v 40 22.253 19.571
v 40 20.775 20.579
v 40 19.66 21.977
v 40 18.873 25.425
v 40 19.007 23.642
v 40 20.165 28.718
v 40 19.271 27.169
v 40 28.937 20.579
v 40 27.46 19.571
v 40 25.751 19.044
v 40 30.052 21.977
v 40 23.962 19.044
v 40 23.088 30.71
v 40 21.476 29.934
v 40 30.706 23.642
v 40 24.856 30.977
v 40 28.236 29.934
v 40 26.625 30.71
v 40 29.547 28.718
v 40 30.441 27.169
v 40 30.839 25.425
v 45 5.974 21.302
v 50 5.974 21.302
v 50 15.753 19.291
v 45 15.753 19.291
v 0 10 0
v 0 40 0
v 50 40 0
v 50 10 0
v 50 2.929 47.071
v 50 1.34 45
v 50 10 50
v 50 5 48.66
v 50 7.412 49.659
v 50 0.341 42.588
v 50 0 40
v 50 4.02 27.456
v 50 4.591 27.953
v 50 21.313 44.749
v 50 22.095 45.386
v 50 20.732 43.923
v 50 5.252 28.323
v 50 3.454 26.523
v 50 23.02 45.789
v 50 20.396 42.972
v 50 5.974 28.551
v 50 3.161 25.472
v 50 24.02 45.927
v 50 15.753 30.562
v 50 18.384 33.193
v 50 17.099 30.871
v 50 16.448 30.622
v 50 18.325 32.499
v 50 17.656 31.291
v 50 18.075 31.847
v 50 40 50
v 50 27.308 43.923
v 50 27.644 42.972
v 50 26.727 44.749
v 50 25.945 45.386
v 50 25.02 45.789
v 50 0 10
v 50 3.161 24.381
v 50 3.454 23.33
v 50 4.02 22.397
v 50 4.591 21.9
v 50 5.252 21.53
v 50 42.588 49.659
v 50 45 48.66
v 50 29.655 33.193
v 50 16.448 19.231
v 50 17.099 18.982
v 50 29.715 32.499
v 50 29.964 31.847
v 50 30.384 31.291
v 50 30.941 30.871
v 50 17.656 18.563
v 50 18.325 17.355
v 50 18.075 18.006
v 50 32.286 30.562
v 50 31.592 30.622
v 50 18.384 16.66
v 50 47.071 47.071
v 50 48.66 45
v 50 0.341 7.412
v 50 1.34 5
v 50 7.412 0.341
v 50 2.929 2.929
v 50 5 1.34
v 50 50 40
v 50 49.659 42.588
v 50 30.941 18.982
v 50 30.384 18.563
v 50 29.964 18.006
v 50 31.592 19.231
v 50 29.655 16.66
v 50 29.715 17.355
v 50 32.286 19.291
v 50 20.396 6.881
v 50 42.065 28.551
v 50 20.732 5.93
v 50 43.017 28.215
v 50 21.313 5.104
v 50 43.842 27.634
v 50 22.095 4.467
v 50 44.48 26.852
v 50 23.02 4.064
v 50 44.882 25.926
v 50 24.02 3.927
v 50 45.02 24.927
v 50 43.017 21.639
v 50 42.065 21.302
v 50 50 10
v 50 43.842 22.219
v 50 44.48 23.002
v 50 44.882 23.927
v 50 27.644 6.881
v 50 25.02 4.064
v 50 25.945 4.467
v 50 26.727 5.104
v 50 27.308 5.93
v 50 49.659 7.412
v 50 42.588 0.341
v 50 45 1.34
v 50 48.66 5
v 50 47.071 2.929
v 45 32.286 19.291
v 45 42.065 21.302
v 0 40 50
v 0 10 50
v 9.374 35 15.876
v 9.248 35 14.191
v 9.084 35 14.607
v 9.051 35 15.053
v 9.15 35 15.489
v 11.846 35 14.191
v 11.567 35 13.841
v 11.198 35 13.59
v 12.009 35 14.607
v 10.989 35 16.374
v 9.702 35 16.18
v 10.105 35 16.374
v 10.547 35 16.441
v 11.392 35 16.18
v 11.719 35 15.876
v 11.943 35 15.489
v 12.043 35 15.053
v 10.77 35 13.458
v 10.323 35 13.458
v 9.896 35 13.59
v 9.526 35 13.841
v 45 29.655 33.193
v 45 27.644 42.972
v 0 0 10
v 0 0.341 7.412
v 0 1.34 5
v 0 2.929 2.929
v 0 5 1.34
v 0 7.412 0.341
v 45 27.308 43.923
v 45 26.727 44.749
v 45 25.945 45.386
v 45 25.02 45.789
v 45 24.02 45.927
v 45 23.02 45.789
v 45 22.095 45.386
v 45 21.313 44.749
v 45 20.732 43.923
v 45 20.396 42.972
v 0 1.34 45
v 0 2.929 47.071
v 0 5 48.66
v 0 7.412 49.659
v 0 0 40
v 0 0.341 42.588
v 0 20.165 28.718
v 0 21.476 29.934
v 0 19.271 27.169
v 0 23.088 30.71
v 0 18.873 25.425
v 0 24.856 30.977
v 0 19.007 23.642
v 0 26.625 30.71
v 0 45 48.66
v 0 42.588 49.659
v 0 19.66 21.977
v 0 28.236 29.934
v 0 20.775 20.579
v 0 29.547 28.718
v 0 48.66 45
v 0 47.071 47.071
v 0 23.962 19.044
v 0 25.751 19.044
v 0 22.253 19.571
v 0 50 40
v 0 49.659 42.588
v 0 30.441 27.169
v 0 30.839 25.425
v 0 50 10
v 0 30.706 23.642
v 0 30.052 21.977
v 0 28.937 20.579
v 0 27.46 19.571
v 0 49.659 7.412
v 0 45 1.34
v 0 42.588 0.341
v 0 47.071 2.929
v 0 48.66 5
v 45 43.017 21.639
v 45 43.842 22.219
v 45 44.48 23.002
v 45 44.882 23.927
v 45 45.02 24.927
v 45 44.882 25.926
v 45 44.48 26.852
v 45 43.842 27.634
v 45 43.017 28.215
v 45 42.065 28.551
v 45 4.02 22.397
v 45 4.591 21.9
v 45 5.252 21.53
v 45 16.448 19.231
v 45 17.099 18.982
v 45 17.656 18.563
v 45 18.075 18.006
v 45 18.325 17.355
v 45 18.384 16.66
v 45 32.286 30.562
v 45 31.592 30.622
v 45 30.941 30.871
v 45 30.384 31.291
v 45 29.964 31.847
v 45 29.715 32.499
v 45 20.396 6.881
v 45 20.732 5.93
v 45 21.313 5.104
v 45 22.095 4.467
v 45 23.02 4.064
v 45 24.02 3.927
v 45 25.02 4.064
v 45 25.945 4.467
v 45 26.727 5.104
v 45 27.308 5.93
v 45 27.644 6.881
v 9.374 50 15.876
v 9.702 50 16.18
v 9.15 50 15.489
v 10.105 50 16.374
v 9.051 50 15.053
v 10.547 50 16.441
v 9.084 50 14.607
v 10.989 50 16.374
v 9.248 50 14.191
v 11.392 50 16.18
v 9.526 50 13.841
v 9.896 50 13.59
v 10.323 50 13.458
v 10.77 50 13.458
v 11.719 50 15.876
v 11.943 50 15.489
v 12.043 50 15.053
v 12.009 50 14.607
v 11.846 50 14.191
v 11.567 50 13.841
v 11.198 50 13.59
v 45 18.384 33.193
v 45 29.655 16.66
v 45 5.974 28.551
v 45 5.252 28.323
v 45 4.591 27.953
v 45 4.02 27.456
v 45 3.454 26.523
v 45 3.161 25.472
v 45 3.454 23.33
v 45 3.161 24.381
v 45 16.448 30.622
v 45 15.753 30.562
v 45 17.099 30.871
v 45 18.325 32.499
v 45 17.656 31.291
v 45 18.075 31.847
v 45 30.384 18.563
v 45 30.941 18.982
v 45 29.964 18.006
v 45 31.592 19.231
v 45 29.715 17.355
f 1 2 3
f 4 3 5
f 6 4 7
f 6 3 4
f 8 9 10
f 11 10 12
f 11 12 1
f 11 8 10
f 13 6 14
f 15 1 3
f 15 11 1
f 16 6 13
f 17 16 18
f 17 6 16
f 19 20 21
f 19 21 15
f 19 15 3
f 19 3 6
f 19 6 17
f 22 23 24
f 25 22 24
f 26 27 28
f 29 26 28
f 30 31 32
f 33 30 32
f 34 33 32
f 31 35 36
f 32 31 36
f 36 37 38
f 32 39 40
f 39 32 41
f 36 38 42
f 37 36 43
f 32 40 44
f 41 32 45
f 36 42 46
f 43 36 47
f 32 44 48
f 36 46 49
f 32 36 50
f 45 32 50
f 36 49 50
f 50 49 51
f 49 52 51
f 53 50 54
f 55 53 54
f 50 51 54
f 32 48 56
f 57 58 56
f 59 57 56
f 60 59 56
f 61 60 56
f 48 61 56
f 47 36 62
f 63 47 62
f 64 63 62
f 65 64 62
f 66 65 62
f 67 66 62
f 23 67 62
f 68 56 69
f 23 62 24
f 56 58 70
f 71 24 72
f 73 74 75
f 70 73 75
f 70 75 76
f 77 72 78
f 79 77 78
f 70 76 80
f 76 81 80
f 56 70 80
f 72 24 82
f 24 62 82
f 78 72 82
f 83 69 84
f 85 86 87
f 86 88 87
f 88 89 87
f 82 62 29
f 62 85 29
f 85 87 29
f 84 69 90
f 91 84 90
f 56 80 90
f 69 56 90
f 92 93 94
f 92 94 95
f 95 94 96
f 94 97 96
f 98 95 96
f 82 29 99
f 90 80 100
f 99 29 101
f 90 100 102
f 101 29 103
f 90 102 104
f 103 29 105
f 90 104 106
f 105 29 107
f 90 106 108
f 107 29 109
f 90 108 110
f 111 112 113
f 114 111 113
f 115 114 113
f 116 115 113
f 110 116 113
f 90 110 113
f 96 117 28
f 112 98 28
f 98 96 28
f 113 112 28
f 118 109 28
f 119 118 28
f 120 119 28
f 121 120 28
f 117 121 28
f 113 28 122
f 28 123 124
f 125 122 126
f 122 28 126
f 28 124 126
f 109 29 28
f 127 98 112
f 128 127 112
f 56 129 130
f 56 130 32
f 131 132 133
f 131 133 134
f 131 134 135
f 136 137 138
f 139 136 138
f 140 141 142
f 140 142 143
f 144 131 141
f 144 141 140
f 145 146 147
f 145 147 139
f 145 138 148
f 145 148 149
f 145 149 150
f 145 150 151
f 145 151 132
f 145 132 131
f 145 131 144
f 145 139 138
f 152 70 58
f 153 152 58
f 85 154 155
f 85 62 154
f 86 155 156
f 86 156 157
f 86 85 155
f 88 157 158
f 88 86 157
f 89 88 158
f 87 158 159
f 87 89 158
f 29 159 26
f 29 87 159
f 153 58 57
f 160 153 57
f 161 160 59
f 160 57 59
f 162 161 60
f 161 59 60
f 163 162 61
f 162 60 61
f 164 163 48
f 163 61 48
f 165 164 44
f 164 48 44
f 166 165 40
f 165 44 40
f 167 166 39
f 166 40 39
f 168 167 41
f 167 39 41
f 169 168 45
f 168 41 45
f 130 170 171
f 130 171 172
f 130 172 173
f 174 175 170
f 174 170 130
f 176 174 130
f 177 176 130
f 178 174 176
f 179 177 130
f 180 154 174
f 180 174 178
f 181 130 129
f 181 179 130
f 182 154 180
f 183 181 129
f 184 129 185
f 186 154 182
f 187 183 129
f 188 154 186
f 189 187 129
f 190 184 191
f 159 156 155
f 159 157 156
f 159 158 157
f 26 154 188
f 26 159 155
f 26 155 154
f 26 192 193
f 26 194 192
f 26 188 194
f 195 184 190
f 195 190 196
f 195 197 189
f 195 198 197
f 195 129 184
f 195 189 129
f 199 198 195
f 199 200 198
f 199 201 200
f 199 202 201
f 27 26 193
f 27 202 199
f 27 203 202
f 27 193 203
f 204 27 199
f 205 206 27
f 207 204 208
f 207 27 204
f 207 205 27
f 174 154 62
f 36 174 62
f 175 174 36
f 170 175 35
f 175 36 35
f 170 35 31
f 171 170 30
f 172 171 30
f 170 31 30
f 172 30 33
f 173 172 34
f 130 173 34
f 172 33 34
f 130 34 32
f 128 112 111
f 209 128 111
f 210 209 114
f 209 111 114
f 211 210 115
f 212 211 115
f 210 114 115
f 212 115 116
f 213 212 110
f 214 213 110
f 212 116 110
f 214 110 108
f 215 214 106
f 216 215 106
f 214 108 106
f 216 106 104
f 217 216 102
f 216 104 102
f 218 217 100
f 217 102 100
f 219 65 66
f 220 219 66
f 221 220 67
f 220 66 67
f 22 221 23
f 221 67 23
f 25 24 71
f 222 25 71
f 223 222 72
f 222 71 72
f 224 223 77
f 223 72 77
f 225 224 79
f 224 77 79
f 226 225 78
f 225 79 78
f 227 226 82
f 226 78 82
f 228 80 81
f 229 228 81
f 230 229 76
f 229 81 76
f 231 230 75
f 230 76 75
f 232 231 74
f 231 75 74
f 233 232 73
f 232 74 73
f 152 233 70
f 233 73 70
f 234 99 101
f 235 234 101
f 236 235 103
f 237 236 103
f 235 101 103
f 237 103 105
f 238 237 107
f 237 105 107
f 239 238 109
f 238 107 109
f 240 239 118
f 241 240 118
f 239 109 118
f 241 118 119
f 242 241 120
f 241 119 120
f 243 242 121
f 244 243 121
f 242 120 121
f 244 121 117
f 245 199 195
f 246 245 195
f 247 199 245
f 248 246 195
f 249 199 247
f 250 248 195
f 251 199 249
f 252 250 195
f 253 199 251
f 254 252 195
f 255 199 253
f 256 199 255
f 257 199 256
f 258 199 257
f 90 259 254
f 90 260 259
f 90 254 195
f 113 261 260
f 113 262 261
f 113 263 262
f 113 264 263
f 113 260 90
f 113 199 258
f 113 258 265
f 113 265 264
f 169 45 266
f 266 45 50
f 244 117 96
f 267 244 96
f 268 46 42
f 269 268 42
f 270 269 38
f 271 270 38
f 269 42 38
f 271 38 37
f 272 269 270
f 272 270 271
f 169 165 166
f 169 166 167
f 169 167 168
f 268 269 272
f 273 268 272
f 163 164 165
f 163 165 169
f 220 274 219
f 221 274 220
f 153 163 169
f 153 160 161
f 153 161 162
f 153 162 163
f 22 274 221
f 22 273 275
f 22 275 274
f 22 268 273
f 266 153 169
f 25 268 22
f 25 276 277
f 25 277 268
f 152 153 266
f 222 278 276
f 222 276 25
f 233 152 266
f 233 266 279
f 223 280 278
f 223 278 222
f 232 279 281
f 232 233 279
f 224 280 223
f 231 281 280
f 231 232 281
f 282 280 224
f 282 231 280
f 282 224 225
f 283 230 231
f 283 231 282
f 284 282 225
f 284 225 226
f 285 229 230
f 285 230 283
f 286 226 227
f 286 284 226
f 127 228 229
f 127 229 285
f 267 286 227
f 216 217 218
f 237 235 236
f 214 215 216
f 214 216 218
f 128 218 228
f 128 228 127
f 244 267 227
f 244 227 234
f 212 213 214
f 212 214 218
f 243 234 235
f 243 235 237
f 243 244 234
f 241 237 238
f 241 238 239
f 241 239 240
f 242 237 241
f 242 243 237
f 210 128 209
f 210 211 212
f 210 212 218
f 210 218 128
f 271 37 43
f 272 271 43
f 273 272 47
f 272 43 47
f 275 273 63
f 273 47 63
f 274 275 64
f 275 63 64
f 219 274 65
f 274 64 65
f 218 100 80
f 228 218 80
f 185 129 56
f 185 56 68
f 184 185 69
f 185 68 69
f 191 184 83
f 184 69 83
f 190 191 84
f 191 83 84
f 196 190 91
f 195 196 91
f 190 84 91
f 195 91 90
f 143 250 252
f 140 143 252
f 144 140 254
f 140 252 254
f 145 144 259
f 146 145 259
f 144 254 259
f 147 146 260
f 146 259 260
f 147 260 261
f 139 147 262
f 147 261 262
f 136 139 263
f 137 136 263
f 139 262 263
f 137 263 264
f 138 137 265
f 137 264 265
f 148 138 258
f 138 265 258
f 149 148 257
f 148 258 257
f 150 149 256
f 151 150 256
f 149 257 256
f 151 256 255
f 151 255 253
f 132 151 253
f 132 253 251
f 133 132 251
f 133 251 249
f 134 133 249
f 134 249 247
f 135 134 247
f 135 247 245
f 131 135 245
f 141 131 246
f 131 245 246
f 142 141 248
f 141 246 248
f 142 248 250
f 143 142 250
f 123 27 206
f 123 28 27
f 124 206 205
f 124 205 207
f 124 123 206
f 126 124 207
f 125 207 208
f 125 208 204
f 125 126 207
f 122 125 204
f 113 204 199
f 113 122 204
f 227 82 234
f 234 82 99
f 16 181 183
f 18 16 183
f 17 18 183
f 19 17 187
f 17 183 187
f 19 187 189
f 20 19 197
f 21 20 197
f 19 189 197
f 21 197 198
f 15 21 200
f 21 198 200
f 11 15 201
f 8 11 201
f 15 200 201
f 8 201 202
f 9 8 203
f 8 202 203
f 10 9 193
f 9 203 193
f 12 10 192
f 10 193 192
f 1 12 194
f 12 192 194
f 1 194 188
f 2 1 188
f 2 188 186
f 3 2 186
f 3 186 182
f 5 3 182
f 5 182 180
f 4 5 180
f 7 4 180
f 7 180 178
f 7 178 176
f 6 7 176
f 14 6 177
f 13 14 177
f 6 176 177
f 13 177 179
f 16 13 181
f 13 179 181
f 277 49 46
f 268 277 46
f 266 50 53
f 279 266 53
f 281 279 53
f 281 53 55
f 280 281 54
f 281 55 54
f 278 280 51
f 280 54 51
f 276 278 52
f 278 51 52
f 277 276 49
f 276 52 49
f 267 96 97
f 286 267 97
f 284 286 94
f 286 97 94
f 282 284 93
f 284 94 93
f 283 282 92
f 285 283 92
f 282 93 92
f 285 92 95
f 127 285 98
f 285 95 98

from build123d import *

# Parameters (mm, degrees)
ESQUISSE1_W             = 50
ESQUISSE1_H             = 50
BOSS_EXTRU_1_DEPTH      = 50
ESQUISSE2_R             = 6
ENL_V_MAT_EXTRU_1_DEPTH = 40
CONG_1_R                = 10
ESQUISSE3_R             = 1.5
ENL_V_MAT_EXTRU_2_DEPTH = 15
ENL_V_MAT_EXTRU_3_DEPTH = 5


with BuildPart() as part:
    # Esquisse1 → Boss.-Extru.1 (new body)
    with BuildSketch(Plane.XY):
        with Locations((25, 25)):
            Rectangle(ESQUISSE1_W, ESQUISSE1_H)
    extrude(amount=BOSS_EXTRU_1_DEPTH)

    # Esquisse2 → Enlèv. mat.-Extru.1 (cut)
    with BuildSketch(Plane.ZY):
        with Locations((24.976890997, 24.856256207)):
            Circle(ESQUISSE2_R)
    extrude(amount=-ENL_V_MAT_EXTRU_1_DEPTH, mode=Mode.SUBTRACT)

    # Congé1
    cong_1_edges = [part.edges().sort_by_distance(p)[0] for p in [
        (25, 50, 50),
        (25, 50, 0),
        (25, 0, 0),
        (25, 0, 50),
    ]]
    fillet(cong_1_edges, radius=CONG_1_R)

    # Esquisse3 → Enlèv. mat.-Extru.2 (cut)
    with BuildSketch(Plane(origin=(0, 50, 0), x_dir=(1, 0, 0), z_dir=(0, 1, 0))):
        with Locations(Location((10.546738136, -14.940962314, 0), (0, 0, 270))):
            Circle(ESQUISSE3_R)
    extrude(amount=-ENL_V_MAT_EXTRU_2_DEPTH, mode=Mode.SUBTRACT)

    # Esquisse4 → Enlèv. mat.-Extru.3 (cut)
    with BuildSketch(Plane(origin=(50, 0, 0), x_dir=(0, 0, -1), z_dir=(1, 0, 0))):
        with BuildLine():
            Line((-19.291182269, 32.286465455), (-21.302414692, 42.065190949))
            ThreePointArc((-21.302414692, 42.065190949), (-24.926554612, 45.019798544), (-28.550694532, 42.065190949))
            Line((-28.550694532, 42.065190949), (-30.561926955, 32.286465455))
            ThreePointArc((-30.561926955, 32.286465455), (-31.290515643, 30.383759574), (-33.193221523, 29.655170887))
            Line((-33.193221523, 29.655170887), (-42.971947017, 27.643938464))
            ThreePointArc((-42.971947017, 27.643938464), (-45.926554612, 24.019798544), (-42.971947017, 20.395658623))
            Line((-42.971947017, 20.395658623), (-33.193221523, 18.384426201))
            ThreePointArc((-33.193221523, 18.384426201), (-31.290515643, 17.655837513), (-30.561926955, 15.753131632))
            Line((-30.561926955, 15.753131632), (-28.550694532, 5.974406139))
            ThreePointArc((-28.550694532, 5.974406139), (-28.155011664, 4.912296106), (-27.45637674, 4.019798544))
            ThreePointArc((-27.45637674, 4.019798544), (-24.926554612, 3.123395403), (-22.396732484, 4.019798544))
            ThreePointArc((-22.396732484, 4.019798544), (-21.69809756, 4.912296106), (-21.302414692, 5.974406139))
            Line((-21.302414692, 5.974406139), (-19.291182269, 15.753131632))
            ThreePointArc((-19.291182269, 15.753131632), (-18.562593581, 17.655837513), (-16.6598877, 18.384426201))
            Line((-16.6598877, 18.384426201), (-6.881162207, 20.395658623))
            ThreePointArc((-6.881162207, 20.395658623), (-3.926554612, 24.019798544), (-6.881162207, 27.643938464))
            Line((-6.881162207, 27.643938464), (-16.6598877, 29.655170887))
            ThreePointArc((-16.6598877, 29.655170887), (-18.562593581, 30.383759574), (-19.291182269, 32.286465455))
        make_face()
    extrude(amount=-ENL_V_MAT_EXTRU_3_DEPTH, mode=Mode.SUBTRACT)


solid = part.part
